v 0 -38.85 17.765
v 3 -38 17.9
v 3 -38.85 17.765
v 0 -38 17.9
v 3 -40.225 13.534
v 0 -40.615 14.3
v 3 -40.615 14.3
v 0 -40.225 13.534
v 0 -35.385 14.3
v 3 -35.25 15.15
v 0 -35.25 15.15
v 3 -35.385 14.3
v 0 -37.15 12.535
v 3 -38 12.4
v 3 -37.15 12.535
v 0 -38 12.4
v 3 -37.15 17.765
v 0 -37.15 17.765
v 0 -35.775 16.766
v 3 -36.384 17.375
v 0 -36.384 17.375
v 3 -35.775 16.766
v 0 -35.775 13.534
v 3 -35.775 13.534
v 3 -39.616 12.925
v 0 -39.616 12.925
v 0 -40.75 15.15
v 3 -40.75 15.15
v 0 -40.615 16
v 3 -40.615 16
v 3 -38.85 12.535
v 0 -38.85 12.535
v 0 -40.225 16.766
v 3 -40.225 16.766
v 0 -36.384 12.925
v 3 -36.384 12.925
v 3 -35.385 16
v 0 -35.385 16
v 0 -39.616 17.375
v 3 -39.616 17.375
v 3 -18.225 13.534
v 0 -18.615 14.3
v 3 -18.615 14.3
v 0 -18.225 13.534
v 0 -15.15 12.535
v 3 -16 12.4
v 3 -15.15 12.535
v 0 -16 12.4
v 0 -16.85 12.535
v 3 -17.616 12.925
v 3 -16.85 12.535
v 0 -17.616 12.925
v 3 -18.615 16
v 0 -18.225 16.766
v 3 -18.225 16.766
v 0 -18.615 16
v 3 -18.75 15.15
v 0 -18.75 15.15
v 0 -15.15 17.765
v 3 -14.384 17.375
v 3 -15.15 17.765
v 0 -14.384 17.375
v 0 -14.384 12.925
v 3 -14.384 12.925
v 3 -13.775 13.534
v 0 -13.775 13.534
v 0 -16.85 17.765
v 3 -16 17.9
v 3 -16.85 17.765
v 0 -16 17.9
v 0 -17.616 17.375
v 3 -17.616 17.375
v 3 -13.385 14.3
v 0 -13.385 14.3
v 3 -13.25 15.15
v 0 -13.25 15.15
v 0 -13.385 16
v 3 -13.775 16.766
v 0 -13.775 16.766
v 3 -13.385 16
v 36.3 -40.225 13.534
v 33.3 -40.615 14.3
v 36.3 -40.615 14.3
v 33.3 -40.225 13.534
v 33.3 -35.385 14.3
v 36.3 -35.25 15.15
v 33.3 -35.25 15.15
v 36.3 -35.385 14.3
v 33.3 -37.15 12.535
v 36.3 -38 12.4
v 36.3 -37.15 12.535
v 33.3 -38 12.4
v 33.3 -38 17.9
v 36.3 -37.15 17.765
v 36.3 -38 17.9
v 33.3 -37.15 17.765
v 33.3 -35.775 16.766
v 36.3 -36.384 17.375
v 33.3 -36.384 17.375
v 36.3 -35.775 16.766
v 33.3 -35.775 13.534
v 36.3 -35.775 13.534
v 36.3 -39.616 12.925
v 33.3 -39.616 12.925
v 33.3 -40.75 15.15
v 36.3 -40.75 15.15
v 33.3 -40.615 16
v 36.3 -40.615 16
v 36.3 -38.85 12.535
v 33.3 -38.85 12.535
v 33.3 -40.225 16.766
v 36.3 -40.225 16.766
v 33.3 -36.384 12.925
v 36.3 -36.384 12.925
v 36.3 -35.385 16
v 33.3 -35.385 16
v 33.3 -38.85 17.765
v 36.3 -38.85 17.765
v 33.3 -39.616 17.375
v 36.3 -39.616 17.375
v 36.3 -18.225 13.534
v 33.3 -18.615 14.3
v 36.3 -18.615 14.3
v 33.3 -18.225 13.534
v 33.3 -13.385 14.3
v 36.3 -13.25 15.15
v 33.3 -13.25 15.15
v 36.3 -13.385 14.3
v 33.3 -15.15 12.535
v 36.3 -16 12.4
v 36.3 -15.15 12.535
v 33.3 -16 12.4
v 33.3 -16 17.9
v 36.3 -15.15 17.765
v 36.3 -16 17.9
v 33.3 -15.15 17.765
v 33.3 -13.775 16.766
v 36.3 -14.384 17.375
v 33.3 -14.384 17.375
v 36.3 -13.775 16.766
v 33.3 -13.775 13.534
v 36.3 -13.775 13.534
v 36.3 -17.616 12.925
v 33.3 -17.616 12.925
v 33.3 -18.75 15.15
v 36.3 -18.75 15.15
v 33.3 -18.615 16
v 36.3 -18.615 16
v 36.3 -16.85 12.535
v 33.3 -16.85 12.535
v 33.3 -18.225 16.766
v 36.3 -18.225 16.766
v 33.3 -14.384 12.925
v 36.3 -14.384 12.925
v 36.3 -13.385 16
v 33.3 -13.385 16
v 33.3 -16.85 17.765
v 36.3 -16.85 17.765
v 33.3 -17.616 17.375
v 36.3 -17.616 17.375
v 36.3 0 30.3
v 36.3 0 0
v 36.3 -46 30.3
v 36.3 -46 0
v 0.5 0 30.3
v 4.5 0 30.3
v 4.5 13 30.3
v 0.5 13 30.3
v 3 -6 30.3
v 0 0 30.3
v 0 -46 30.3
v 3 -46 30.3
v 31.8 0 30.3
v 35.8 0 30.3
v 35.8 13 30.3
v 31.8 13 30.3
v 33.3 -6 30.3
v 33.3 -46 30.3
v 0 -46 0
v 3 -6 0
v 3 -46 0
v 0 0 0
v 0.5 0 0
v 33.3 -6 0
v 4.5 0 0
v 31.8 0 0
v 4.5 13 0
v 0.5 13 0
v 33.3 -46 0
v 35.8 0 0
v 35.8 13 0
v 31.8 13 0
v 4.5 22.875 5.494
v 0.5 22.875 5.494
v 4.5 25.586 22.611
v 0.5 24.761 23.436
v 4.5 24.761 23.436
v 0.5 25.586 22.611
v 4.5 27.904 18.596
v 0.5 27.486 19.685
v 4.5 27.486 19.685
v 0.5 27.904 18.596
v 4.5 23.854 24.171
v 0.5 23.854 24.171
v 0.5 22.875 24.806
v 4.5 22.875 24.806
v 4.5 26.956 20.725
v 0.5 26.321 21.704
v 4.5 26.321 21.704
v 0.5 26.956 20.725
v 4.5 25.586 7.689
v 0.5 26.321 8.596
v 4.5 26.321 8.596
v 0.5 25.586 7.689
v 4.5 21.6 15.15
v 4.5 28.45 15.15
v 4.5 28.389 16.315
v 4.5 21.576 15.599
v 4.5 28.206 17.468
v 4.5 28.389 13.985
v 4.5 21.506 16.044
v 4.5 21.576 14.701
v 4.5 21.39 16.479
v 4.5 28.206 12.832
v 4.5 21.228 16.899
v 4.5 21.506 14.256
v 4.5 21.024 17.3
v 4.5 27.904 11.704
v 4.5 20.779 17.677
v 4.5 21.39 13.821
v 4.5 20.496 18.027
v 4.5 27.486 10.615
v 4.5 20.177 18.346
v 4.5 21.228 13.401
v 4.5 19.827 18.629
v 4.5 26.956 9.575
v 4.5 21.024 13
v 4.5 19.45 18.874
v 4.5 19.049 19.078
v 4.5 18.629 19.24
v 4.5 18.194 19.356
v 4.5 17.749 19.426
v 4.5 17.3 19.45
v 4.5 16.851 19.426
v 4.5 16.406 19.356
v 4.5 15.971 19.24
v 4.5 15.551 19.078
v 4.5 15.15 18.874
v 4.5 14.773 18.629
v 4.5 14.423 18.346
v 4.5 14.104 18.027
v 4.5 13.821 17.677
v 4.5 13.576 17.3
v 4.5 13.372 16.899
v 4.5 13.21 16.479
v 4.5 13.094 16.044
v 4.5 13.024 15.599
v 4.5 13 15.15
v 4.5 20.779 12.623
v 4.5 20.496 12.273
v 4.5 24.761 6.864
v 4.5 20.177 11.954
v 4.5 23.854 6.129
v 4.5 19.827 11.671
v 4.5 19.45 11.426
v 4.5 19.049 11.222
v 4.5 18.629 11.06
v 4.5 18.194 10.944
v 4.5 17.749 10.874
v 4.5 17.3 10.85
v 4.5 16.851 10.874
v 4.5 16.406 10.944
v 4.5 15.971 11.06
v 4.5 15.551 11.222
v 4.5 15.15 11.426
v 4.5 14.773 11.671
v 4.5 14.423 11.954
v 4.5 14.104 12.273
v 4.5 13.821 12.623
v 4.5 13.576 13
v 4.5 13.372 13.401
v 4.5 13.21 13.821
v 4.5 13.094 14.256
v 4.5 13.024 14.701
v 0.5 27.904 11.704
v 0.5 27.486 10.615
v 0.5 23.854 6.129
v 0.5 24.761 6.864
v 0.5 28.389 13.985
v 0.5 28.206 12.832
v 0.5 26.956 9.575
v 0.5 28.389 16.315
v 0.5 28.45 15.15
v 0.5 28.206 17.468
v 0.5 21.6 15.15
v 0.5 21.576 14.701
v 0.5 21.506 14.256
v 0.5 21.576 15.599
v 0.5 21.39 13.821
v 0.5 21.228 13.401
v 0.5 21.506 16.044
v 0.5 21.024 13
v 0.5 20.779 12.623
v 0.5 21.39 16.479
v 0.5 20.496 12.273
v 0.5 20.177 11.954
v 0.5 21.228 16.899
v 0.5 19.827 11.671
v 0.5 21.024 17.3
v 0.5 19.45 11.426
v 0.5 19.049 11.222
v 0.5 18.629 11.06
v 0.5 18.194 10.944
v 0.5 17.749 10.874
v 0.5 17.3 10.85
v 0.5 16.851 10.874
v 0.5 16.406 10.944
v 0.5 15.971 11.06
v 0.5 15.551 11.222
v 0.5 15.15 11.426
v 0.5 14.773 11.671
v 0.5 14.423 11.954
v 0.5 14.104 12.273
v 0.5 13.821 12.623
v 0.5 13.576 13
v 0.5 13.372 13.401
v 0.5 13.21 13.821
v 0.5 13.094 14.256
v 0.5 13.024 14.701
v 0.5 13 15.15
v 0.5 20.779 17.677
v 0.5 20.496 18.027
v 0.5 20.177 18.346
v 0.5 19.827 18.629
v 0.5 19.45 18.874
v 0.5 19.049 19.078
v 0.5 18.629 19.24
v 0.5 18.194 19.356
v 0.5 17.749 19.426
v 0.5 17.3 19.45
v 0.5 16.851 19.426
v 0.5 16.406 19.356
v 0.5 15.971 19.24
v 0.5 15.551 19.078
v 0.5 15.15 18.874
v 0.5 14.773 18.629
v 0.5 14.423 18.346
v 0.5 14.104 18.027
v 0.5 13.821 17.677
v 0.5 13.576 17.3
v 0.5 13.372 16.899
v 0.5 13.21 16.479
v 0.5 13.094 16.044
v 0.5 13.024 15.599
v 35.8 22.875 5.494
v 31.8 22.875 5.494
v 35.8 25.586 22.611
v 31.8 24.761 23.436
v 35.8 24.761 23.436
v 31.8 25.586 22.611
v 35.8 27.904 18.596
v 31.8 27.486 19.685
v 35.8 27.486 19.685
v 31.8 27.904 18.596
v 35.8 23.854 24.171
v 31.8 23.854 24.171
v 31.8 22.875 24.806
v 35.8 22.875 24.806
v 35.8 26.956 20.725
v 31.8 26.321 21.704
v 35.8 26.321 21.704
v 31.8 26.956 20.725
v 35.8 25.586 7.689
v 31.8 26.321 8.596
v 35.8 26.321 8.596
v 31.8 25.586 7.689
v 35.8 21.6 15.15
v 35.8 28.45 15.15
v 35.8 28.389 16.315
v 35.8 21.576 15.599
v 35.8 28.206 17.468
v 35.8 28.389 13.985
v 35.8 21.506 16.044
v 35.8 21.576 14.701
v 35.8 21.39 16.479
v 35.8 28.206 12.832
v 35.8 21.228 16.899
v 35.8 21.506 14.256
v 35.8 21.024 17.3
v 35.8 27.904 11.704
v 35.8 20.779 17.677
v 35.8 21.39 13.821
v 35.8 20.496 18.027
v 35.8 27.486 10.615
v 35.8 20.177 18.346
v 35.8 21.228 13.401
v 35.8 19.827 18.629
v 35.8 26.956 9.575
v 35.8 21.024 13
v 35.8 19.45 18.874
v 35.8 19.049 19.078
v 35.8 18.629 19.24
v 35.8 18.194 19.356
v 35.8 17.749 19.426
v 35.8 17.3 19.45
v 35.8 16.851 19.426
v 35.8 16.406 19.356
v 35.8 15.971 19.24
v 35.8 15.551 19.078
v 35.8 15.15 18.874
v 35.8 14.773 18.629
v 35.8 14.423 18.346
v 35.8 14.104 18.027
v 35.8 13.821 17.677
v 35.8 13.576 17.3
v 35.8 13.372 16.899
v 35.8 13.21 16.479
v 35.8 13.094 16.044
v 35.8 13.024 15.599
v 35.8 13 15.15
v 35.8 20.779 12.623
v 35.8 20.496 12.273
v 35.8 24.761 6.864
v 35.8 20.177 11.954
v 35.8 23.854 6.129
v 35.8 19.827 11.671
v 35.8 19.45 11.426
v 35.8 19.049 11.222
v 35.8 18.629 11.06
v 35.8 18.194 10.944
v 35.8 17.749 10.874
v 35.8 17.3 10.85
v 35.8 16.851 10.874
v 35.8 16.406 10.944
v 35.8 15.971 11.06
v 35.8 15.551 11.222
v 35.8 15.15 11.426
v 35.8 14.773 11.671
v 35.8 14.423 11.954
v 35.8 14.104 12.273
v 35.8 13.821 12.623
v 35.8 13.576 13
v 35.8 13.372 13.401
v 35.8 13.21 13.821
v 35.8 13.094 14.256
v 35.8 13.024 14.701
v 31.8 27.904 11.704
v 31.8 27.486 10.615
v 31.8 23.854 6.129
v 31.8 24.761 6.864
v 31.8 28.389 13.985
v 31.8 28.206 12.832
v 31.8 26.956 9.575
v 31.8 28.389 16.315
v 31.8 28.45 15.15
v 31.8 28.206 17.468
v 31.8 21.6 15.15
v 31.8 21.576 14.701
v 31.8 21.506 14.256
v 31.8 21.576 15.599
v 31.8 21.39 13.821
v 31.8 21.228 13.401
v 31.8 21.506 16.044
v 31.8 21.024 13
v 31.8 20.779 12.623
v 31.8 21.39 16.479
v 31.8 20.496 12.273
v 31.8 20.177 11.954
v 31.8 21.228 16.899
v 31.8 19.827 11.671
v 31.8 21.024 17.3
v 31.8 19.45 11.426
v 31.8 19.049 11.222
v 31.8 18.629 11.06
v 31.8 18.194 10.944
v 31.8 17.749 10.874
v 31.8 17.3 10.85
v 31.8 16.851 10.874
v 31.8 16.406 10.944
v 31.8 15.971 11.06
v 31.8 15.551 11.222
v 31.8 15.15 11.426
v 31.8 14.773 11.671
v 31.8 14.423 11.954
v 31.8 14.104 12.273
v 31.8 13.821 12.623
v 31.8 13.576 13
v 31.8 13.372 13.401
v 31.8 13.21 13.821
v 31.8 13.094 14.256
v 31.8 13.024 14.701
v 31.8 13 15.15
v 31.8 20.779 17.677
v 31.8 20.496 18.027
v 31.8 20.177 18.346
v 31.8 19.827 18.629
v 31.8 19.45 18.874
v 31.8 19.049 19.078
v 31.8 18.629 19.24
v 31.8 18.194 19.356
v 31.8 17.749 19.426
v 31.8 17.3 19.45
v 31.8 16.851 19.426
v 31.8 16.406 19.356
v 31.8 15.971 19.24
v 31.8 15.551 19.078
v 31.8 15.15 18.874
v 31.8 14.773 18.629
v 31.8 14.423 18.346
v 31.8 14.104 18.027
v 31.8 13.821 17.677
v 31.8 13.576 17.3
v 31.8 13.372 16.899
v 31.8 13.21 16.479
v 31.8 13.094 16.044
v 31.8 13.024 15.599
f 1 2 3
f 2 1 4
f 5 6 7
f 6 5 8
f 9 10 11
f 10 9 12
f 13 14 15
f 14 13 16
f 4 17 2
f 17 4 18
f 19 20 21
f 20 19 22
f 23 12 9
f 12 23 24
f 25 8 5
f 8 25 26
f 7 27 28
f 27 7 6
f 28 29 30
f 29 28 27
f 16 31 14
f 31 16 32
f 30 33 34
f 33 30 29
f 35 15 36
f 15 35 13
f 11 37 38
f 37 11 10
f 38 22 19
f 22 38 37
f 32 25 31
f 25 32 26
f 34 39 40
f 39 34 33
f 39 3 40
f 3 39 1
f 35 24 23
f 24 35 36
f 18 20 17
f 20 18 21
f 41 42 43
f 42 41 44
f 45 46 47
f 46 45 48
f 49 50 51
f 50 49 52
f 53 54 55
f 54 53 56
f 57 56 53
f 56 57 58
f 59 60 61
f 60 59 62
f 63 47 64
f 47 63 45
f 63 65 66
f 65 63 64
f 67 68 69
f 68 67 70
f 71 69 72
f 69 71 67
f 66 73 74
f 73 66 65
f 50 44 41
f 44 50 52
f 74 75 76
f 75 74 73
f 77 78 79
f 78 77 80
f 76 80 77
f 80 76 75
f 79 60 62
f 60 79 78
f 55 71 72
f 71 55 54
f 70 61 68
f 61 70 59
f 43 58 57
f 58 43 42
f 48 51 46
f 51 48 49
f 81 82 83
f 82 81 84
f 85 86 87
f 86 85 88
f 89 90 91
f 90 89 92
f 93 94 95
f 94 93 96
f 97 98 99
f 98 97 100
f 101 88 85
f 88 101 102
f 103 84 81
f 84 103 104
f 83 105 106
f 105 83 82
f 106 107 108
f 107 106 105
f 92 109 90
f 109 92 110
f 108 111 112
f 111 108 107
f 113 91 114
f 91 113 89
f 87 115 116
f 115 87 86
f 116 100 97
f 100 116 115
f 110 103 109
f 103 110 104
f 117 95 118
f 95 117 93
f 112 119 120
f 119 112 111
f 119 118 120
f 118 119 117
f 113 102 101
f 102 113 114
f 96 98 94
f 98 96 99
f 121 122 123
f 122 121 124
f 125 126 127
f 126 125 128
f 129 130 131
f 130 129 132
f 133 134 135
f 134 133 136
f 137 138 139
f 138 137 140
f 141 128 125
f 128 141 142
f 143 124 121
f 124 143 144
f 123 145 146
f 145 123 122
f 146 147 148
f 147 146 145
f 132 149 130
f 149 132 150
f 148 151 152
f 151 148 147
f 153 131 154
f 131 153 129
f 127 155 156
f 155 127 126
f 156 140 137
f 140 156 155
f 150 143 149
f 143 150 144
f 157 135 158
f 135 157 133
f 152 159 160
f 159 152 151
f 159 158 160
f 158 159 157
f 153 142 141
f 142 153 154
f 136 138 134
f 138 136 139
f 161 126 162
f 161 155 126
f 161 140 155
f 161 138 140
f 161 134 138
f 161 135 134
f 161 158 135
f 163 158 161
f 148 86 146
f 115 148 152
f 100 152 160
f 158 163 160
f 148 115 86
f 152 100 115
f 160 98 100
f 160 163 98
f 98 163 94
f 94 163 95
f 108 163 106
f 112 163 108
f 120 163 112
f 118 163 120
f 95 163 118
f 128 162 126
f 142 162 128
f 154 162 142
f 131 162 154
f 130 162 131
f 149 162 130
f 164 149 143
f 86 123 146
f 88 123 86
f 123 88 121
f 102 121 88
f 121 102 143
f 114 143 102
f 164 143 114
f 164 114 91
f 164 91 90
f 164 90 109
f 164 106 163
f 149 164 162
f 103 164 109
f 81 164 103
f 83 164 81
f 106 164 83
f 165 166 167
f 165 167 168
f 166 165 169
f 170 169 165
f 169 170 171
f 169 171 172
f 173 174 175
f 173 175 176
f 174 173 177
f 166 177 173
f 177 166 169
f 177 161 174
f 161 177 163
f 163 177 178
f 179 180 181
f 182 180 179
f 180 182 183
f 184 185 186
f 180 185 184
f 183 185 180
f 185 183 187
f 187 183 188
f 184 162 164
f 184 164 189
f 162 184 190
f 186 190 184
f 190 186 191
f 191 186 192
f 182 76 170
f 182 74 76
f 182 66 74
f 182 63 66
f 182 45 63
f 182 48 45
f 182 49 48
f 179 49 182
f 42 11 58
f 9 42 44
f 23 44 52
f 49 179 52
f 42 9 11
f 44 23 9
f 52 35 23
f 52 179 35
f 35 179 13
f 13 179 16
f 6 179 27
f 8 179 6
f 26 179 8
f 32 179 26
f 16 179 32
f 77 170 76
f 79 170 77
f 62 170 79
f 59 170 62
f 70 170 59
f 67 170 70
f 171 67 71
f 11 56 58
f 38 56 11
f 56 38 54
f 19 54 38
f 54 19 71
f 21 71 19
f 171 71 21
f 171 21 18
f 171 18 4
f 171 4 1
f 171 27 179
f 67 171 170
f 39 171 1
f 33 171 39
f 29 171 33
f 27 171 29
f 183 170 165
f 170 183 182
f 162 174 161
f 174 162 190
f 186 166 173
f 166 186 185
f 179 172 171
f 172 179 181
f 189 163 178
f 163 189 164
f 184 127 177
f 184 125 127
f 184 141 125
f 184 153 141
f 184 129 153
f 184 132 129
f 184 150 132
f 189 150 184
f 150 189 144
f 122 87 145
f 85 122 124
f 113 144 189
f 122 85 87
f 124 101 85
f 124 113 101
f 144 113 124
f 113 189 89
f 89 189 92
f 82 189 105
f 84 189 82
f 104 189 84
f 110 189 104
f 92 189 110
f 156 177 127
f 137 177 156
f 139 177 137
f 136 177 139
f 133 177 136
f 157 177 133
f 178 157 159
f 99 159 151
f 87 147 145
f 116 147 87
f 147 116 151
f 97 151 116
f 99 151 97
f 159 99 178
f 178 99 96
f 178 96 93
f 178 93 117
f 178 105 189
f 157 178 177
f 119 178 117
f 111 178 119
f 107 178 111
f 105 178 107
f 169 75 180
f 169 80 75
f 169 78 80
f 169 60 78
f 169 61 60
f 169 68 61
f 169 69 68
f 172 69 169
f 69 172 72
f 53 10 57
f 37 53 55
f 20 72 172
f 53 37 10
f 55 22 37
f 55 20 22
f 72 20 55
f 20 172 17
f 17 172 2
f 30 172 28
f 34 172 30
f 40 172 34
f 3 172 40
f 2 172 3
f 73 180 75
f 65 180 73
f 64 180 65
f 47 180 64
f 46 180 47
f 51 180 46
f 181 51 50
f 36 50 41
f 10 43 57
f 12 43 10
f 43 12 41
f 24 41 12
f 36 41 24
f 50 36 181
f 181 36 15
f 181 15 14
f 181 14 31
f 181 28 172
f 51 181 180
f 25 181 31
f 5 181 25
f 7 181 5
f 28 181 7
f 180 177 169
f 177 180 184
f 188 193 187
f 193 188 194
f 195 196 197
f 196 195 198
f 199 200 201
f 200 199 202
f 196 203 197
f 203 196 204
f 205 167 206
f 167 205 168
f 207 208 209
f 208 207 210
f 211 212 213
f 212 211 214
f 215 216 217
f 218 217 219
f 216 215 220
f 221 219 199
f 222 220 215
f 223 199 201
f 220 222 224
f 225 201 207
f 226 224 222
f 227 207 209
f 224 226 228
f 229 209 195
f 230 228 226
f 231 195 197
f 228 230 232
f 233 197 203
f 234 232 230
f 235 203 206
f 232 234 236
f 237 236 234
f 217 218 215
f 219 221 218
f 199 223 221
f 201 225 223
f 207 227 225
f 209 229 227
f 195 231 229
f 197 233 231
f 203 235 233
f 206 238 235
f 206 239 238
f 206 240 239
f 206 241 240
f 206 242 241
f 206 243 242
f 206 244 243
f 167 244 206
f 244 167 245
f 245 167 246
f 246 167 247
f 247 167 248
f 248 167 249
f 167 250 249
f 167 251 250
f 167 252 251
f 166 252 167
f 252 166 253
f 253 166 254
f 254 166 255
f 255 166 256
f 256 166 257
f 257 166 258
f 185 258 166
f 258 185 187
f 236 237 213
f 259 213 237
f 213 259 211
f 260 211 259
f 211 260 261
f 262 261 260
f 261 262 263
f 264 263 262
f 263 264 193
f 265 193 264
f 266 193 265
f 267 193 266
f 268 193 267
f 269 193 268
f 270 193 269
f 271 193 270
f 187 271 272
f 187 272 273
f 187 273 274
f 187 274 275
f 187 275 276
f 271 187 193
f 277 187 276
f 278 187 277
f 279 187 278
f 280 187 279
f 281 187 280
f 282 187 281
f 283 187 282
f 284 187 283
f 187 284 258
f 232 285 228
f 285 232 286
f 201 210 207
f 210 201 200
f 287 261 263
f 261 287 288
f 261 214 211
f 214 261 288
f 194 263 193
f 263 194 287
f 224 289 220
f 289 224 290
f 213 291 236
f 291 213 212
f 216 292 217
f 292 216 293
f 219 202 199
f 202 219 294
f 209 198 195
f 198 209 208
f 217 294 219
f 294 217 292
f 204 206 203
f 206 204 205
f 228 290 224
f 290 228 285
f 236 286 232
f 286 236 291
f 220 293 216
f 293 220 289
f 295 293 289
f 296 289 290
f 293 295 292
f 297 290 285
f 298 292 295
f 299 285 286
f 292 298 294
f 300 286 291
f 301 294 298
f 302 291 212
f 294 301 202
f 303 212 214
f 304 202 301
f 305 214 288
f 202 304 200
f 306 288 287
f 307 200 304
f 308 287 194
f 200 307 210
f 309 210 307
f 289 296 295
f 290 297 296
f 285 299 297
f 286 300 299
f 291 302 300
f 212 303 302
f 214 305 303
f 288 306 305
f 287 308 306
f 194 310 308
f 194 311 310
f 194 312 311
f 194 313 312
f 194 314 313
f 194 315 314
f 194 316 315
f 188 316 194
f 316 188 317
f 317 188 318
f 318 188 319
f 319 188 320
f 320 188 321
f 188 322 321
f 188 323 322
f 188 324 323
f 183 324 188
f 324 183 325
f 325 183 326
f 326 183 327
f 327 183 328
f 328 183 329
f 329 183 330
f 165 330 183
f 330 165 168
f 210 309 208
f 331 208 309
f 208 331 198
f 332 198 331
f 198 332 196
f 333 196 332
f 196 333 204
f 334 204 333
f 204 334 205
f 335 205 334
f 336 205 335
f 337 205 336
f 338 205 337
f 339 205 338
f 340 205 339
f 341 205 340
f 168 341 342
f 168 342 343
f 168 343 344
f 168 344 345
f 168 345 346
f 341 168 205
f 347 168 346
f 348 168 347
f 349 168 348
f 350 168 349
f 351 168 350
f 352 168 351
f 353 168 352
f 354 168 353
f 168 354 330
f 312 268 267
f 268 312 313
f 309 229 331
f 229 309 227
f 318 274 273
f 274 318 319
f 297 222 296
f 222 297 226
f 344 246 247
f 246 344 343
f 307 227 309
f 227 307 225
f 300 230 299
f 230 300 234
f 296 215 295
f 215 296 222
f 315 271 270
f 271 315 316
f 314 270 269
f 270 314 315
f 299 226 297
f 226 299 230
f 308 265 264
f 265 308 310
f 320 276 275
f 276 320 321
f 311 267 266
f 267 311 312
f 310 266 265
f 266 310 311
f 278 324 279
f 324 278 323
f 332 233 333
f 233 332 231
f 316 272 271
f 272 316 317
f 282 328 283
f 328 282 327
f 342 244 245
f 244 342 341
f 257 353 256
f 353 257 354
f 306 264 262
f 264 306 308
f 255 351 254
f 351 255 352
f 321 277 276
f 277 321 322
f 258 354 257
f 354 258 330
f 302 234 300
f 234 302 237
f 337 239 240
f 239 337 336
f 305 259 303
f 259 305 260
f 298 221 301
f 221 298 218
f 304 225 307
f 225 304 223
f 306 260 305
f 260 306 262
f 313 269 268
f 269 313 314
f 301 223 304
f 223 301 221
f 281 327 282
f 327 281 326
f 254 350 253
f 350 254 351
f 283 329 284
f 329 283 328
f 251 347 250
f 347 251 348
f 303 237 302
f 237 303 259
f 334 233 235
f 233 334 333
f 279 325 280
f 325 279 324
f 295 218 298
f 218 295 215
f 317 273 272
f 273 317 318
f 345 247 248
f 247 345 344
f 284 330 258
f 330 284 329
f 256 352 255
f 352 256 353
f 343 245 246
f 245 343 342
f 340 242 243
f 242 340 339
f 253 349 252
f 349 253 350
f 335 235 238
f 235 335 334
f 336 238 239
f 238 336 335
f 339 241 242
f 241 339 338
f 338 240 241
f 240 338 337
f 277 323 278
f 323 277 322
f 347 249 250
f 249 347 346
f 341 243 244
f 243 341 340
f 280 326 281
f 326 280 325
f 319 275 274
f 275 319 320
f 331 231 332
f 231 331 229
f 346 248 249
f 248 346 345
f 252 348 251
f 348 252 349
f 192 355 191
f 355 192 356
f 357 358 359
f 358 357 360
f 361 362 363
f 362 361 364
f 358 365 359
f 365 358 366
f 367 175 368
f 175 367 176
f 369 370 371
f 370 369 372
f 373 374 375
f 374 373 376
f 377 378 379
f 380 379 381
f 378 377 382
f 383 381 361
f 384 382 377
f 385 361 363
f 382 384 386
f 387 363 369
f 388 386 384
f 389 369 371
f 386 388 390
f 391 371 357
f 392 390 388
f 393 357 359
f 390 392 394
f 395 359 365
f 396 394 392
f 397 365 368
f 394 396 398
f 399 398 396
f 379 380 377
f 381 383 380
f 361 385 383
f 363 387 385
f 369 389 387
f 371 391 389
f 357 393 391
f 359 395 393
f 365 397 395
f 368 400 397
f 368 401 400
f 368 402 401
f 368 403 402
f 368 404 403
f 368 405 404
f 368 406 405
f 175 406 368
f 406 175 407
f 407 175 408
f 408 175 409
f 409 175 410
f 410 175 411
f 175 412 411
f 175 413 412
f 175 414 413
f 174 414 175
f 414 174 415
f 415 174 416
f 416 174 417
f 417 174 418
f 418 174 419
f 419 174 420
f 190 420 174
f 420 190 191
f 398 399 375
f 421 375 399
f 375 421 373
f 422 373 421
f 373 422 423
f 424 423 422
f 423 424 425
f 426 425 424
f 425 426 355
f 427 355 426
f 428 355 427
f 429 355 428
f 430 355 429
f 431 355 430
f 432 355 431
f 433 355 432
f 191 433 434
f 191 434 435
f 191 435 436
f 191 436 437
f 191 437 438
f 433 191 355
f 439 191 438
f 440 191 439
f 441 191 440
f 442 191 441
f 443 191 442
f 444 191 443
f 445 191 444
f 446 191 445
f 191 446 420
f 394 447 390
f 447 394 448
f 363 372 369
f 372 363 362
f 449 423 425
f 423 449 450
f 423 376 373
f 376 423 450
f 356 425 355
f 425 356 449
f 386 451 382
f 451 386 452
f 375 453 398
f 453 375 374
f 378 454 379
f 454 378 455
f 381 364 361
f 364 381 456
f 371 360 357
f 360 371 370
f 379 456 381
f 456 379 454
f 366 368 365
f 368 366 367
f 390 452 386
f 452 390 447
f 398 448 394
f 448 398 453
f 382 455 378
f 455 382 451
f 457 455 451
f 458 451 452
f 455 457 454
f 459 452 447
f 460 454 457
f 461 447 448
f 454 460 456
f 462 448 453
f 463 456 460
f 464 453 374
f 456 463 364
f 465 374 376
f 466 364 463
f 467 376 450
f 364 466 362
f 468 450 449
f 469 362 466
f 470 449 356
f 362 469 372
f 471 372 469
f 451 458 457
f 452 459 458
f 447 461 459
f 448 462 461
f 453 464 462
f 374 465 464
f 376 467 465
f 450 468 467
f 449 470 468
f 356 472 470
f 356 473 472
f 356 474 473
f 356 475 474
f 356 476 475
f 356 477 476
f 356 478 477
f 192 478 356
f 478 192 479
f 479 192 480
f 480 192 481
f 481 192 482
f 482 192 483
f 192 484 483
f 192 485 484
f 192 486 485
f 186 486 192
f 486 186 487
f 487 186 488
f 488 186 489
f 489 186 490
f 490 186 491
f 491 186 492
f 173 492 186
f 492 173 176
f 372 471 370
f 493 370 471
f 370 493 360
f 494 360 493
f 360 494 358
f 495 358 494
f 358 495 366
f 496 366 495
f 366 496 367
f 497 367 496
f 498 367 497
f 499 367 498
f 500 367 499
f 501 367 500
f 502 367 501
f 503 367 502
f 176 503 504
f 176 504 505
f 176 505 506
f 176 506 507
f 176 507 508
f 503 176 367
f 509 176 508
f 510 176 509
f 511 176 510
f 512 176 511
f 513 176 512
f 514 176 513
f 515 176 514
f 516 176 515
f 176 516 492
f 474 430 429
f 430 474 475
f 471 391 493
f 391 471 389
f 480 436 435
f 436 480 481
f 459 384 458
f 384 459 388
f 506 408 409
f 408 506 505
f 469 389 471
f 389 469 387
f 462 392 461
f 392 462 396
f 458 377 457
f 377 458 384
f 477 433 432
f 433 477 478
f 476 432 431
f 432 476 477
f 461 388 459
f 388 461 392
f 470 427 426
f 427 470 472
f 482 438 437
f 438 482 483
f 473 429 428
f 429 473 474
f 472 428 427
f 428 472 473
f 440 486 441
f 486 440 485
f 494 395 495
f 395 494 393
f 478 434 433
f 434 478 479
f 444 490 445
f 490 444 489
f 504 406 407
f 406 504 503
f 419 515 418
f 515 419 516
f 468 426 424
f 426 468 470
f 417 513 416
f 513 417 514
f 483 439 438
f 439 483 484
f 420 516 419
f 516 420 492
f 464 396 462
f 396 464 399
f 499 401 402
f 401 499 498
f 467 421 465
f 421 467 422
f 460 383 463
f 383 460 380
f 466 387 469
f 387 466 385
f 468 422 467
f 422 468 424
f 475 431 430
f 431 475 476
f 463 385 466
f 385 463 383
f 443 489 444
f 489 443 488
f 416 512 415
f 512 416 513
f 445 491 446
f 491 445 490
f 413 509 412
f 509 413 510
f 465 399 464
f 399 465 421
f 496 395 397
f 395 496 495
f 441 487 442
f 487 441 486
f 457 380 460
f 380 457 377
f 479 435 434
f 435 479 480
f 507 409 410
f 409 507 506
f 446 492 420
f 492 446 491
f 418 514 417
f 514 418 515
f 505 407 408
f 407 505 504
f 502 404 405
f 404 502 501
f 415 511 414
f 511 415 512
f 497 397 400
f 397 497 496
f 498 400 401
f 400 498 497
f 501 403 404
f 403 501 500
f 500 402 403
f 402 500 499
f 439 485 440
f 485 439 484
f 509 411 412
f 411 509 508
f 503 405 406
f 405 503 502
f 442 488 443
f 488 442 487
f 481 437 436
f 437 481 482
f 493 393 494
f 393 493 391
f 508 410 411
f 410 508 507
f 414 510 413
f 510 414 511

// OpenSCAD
// file: lib/ALU_joint_B.scad
include <../../parameters.scad>

module ALU_joint_B(height) {
    difference() {
        hull() {
            cube([4, 608_bearing_outer_diameter-M8_screw_diameter/2-5, height]);

            translate([0, 608_bearing_outer_diameter-5, height/2])
                rotate([0, 90, 0])
                    cylinder(d=608_bearing_outer_diameter, h=4, $fn=60);
        }
        translate([-0.1, 608_bearing_outer_diameter-5, height/2])
            rotate([0, 90, 0])
                cylinder(d=M8_screw_diameter, h=4.2, $fn=60);
    }
}
ALU_joint_B(25);
// file: lib/ALU_profile_holder_top.scad
include <../../parameters.scad>



module ALU_profile_holder_top(deep=35) {
    wall_thickness = ALU_profile_holder_wall_thickness;
    
    module screw_holes() {
        translate([wall_thickness/2, 8, ALU_profile_width/2]) {
            rotate([0, 90, 0]) 
                cylinder(d=M5_screw_diameter, h=wall_thickness*2, center=true, $fn=20);
        }
        translate([wall_thickness/2, deep-10, ALU_profile_width/2]) {
                rotate([0, 90, 0])
                cylinder(d=M5_screw_diameter, h=wall_thickness*2, center=true, $fn=20);
            
        }
    }
    
    difference() {
        cube([ALU_profile_width+wall_thickness*2, deep+wall_thickness*2, ALU_profile_width]);
        translate([wall_thickness, -0.1, -0.1])
            cube([ALU_profile_width, deep+0.1, ALU_profile_width+0.2]);
        
        screw_holes();
        translate([ALU_profile_width+wall_thickness, 0, 0])
            screw_holes();
    }
}

ALU_profile_holder_top(35);
// file: ../parameters.scad
maximum_printable_size = 150;

layer_thickness = 0.3;
global_clearance = 0.5;

platform_base_diameter = 400; // Průměr ukotvení válců spodní platformy
platform_base_thickness = 20;
platform_cylinder_medium_length = 250;  // délka pneumatického válce s pístem vysunutým do poloviny rozsahu
platform_base_cylinder_spacing = 38;    //rozestupy spodního a horního ukotvení válců.
platform_top_cylinder_spacing = 30;
platform_top_diameter = 150;   // Průměr horní základny (vdálenost od středu základny do středu kulového kloubu ke kterému je uchycen pneumatický válec)


// screw length step - minimum difference in length between two types of screws
basic_screw_length = 5;


//Screw diameter and nut for M10 [mm]
M10_screw_diameter = 10.4;
M10_head_height = 10;
M10_head_diameter = 16+0.5;
M10_nut_height = 10.5;
M10_nut_diameter = 25.5;
M10_nut_pocket = 22.3;

//Screw diameter for M8 [mm]
M8_screw_diameter = 8.6;
M8_head_height = 8;
M8_head_diameter = 13.5;
M8_nut_height = 7.5;
M8_square_nut_thin_height = 4.5;
M8_nut_diameter = 14.4 + 0.5;
M8_nut_pocket = 13 + 0.5;
M8_washer_diameter = 16;
M8_washer_thickness = 1.5;


//Screw diameter and nut for M6 [mm]
M6_screw_diameter=6.5;
M6_head_diameter = 10+0.5;
M6_head_height = 6;
M6_nut_height = 4.9;
M6_nut_diameter = 11.8;
M6_nut_pocket = 10.4;
M6_square_nut_height = 3;
M6_square_nut_diameter = 10;

//Screw diameter and nut for M5 [mm]
M5_screw_diameter=5.5;
M5_head_height = 5;
M5_head_diameter = 13+0.5;
M5_nut_height = 4.5;
M5_nut_diameter = 9.4;
M5_nut_pocket = 8.4;

//Screw diameter and nut for M4 [mm]
M4_screw_diameter=4.5;
M4_screw_head_height = 4;
M4_nut_height = 3.2;
M4_nut_diameter = 8.4;
M4_nut_pocket = 7.5;

//Screw diameter and nut for M3 [mm]
M3_screw_diameter = 3.2;
M3_nut_height = 2.7;
M3_nut_diameter = 6.6;
M3_nut_pocket = 5.6;
M3_screw_head_height = 3;

//Screw diameter and nut for M2,5 [mm]
M2_5_screw_diameter = 2.7;
M2_5_nut_height = 2.3;
M2_5_nut_diameter = 6;
M2_5_nut_pocket = 5.5;

// kulove lozisko

bearing_efsm_08_h = 33+1;
bearing_efsm_08_m = 22;
bearing_efsm_08_db = 18;
bearing_efsm_08_ag = 10.5;
bearing_efsm_08_n = M4_screw_diameter;
bearing_efsm_08_a1 = 5.5;
bearing_efsm_08_d = 8.25;
bearing_efsm_08_B = 8; // ball height

bearing_efsm_10_h = 38+1;
bearing_efsm_10_m = 26;
bearing_efsm_10_db = 21.9;
bearing_efsm_10_ag = 12+0.2;
bearing_efsm_10_n = M5_screw_diameter;
bearing_efsm_10_a1 = 6.5;
bearing_efsm_10_d = 10.25;


bearing_efsm_12_width = 40+1;
bearing_efsm_12_h = bearing_efsm_12_width;
bearing_efsm_12_boltd = 28/2; // polovina vzdalenosti mezi srouby
bearing_efsm_12_m = bearing_efsm_12_boltd*2;
bearing_efsm_12_db = 25;
bearing_efsm_12_ag = 13;
bearing_efsm_12_a1 = 7;
bearing_efsm_12_n = M5_screw_diameter;
bearing_efsm_12_d = 12.15;
bearing_efsm_12_B = 10; // ball height
bearing_efsm_space = 1;

bearing_efsm_17_width = 54+1;
bearing_efsm_17_h = bearing_efsm_17_width;
bearing_efsm_17_boltd = 38/2; // polovina vzdalenosti mezi srouby
bearing_efsm_17_m = bearing_efsm_17_boltd*2;
bearing_efsm_17_db = 35;
bearing_efsm_17_ag = 18;
bearing_efsm_17_n = M6_screw_diameter;
bearing_efsm_17_a1 = 10;
bearing_efsm_17_B = 17; // ball height

//limcove lozisko
bearing_EFOM_10_L=26; //celkova sirka zakladny
bearing_EFOM_10_d1=10.3;//diametr otvoru real=10 mm
bearing_EFOM_10_dB=22;//diametr vystupku pro ulozeni lozika
bearing_EFOM_10_H=52;//celková delka zakladny
bearing_EFOM_10_J=36;// hole pitch
bearing_EFOM_10_A1=6.5;//vyska pouzdra
bearing_EFOM_10_Ag=12;//celkova vyska
bearing_EFOM_10_N1=5;//sirka otvoru pro sroub
bearing_EFOM_10_N2=8;//delka otvoru pro sroub
bearing_EFOM_10_m=36;//roztec der pro sroub
bearing_EFOM_10_h=9;//vyska lozika


608_bearing_outer_diameter = 22.3;
608_bearing_inner_diameter = 16;
608_bearing_thickness = 7.1;


// 20 KG servo parameters

servo_20kg_axis_offset = 9.375; // jak je osa mimo stredu
servo_20kg_body_x = 42;
servo_20kg_body_y = 21;
servo_20kg_body_z = 40;
servo_20kg_thread_x = 49/2;
servo_20kg_thread_y = 10/2;
servo_20kg_body_below = 10; // jak hluboko je tělo serva pod drzaky na srouby
servo_20kg_below = 25.8; // jak hluboko je páka serva pod drzaky na srouby

servo_20kg_bolt_d = 2.5+0.3;
servo_20kg_nut_d = 5+0.3;


//strain gauge
strain_gauge_width = 12.7;
strain_gauge_length = 75.1;
strain_gauge_screw_distance = 10;

//ALU profile
ALU_profile_width = 30.3;
ALU_profile_holder_wall_thickness = 3;
ALU_profile_groove_width = 8;

//pillow block bearing
//https://www.igus.eu/product/372
//Part no. KSTM-08
KSTM08_screws_distance = 33;         //m
KSTM08_screws_holes_diameter = 4.5;  //d2
KSTM08_flange_thickness = 6;         //h3
KSTM08_case_width = 9;               //C1
KSTM08_case_length = 47;             //a
KSTM08_ball_width = 12;              //B


//ložiska pro malý rotor
bearing_outer_diameter = 10.2;    // Rozměr B1 v nákresu s přídavkem na toleranci otvoru
bearing_thickness = 4;        // Rozměr B2 v nákresu
//bearing_shaft_length = 19.5;    // Rozměr B3 v nákresu, Originalni hodnota 19.5
bearing_shaft_length = 20;    // Rozměr B3 v nákresu


//parametry víčka s telemetrickou anténou
S01_sila_materialu=1.2;
S01_vyska_horni_zavit=10;
S01_hloubka_zavitu=4;
S01_prumer_vnitrni=50;
LO_spodni_prumer=17.2;
LO_vyska_bez_krytu=15;
S01_tolerance_zavit=1.5;
R01_vyska_prekryti_statoru=10;
// main file
include <../parameters.scad>
use <./lib/ALU_profile_holder_top.scad>
use <./lib/ALU_joint_B.scad>


module 888_5004() {
    podlozka = 0.8; //tloušťka podložky
    deep = 40;

    translate([0, -deep-ALU_profile_holder_wall_thickness*2, 0])
        ALU_profile_holder_top(deep);

    translate([0.5, 0, 0])
        ALU_joint_B(ALU_profile_width);

    translate([ALU_profile_width+ALU_profile_holder_wall_thickness*2-4.5, 0, 0])
        ALU_joint_B(ALU_profile_width);
}

888_5004();
